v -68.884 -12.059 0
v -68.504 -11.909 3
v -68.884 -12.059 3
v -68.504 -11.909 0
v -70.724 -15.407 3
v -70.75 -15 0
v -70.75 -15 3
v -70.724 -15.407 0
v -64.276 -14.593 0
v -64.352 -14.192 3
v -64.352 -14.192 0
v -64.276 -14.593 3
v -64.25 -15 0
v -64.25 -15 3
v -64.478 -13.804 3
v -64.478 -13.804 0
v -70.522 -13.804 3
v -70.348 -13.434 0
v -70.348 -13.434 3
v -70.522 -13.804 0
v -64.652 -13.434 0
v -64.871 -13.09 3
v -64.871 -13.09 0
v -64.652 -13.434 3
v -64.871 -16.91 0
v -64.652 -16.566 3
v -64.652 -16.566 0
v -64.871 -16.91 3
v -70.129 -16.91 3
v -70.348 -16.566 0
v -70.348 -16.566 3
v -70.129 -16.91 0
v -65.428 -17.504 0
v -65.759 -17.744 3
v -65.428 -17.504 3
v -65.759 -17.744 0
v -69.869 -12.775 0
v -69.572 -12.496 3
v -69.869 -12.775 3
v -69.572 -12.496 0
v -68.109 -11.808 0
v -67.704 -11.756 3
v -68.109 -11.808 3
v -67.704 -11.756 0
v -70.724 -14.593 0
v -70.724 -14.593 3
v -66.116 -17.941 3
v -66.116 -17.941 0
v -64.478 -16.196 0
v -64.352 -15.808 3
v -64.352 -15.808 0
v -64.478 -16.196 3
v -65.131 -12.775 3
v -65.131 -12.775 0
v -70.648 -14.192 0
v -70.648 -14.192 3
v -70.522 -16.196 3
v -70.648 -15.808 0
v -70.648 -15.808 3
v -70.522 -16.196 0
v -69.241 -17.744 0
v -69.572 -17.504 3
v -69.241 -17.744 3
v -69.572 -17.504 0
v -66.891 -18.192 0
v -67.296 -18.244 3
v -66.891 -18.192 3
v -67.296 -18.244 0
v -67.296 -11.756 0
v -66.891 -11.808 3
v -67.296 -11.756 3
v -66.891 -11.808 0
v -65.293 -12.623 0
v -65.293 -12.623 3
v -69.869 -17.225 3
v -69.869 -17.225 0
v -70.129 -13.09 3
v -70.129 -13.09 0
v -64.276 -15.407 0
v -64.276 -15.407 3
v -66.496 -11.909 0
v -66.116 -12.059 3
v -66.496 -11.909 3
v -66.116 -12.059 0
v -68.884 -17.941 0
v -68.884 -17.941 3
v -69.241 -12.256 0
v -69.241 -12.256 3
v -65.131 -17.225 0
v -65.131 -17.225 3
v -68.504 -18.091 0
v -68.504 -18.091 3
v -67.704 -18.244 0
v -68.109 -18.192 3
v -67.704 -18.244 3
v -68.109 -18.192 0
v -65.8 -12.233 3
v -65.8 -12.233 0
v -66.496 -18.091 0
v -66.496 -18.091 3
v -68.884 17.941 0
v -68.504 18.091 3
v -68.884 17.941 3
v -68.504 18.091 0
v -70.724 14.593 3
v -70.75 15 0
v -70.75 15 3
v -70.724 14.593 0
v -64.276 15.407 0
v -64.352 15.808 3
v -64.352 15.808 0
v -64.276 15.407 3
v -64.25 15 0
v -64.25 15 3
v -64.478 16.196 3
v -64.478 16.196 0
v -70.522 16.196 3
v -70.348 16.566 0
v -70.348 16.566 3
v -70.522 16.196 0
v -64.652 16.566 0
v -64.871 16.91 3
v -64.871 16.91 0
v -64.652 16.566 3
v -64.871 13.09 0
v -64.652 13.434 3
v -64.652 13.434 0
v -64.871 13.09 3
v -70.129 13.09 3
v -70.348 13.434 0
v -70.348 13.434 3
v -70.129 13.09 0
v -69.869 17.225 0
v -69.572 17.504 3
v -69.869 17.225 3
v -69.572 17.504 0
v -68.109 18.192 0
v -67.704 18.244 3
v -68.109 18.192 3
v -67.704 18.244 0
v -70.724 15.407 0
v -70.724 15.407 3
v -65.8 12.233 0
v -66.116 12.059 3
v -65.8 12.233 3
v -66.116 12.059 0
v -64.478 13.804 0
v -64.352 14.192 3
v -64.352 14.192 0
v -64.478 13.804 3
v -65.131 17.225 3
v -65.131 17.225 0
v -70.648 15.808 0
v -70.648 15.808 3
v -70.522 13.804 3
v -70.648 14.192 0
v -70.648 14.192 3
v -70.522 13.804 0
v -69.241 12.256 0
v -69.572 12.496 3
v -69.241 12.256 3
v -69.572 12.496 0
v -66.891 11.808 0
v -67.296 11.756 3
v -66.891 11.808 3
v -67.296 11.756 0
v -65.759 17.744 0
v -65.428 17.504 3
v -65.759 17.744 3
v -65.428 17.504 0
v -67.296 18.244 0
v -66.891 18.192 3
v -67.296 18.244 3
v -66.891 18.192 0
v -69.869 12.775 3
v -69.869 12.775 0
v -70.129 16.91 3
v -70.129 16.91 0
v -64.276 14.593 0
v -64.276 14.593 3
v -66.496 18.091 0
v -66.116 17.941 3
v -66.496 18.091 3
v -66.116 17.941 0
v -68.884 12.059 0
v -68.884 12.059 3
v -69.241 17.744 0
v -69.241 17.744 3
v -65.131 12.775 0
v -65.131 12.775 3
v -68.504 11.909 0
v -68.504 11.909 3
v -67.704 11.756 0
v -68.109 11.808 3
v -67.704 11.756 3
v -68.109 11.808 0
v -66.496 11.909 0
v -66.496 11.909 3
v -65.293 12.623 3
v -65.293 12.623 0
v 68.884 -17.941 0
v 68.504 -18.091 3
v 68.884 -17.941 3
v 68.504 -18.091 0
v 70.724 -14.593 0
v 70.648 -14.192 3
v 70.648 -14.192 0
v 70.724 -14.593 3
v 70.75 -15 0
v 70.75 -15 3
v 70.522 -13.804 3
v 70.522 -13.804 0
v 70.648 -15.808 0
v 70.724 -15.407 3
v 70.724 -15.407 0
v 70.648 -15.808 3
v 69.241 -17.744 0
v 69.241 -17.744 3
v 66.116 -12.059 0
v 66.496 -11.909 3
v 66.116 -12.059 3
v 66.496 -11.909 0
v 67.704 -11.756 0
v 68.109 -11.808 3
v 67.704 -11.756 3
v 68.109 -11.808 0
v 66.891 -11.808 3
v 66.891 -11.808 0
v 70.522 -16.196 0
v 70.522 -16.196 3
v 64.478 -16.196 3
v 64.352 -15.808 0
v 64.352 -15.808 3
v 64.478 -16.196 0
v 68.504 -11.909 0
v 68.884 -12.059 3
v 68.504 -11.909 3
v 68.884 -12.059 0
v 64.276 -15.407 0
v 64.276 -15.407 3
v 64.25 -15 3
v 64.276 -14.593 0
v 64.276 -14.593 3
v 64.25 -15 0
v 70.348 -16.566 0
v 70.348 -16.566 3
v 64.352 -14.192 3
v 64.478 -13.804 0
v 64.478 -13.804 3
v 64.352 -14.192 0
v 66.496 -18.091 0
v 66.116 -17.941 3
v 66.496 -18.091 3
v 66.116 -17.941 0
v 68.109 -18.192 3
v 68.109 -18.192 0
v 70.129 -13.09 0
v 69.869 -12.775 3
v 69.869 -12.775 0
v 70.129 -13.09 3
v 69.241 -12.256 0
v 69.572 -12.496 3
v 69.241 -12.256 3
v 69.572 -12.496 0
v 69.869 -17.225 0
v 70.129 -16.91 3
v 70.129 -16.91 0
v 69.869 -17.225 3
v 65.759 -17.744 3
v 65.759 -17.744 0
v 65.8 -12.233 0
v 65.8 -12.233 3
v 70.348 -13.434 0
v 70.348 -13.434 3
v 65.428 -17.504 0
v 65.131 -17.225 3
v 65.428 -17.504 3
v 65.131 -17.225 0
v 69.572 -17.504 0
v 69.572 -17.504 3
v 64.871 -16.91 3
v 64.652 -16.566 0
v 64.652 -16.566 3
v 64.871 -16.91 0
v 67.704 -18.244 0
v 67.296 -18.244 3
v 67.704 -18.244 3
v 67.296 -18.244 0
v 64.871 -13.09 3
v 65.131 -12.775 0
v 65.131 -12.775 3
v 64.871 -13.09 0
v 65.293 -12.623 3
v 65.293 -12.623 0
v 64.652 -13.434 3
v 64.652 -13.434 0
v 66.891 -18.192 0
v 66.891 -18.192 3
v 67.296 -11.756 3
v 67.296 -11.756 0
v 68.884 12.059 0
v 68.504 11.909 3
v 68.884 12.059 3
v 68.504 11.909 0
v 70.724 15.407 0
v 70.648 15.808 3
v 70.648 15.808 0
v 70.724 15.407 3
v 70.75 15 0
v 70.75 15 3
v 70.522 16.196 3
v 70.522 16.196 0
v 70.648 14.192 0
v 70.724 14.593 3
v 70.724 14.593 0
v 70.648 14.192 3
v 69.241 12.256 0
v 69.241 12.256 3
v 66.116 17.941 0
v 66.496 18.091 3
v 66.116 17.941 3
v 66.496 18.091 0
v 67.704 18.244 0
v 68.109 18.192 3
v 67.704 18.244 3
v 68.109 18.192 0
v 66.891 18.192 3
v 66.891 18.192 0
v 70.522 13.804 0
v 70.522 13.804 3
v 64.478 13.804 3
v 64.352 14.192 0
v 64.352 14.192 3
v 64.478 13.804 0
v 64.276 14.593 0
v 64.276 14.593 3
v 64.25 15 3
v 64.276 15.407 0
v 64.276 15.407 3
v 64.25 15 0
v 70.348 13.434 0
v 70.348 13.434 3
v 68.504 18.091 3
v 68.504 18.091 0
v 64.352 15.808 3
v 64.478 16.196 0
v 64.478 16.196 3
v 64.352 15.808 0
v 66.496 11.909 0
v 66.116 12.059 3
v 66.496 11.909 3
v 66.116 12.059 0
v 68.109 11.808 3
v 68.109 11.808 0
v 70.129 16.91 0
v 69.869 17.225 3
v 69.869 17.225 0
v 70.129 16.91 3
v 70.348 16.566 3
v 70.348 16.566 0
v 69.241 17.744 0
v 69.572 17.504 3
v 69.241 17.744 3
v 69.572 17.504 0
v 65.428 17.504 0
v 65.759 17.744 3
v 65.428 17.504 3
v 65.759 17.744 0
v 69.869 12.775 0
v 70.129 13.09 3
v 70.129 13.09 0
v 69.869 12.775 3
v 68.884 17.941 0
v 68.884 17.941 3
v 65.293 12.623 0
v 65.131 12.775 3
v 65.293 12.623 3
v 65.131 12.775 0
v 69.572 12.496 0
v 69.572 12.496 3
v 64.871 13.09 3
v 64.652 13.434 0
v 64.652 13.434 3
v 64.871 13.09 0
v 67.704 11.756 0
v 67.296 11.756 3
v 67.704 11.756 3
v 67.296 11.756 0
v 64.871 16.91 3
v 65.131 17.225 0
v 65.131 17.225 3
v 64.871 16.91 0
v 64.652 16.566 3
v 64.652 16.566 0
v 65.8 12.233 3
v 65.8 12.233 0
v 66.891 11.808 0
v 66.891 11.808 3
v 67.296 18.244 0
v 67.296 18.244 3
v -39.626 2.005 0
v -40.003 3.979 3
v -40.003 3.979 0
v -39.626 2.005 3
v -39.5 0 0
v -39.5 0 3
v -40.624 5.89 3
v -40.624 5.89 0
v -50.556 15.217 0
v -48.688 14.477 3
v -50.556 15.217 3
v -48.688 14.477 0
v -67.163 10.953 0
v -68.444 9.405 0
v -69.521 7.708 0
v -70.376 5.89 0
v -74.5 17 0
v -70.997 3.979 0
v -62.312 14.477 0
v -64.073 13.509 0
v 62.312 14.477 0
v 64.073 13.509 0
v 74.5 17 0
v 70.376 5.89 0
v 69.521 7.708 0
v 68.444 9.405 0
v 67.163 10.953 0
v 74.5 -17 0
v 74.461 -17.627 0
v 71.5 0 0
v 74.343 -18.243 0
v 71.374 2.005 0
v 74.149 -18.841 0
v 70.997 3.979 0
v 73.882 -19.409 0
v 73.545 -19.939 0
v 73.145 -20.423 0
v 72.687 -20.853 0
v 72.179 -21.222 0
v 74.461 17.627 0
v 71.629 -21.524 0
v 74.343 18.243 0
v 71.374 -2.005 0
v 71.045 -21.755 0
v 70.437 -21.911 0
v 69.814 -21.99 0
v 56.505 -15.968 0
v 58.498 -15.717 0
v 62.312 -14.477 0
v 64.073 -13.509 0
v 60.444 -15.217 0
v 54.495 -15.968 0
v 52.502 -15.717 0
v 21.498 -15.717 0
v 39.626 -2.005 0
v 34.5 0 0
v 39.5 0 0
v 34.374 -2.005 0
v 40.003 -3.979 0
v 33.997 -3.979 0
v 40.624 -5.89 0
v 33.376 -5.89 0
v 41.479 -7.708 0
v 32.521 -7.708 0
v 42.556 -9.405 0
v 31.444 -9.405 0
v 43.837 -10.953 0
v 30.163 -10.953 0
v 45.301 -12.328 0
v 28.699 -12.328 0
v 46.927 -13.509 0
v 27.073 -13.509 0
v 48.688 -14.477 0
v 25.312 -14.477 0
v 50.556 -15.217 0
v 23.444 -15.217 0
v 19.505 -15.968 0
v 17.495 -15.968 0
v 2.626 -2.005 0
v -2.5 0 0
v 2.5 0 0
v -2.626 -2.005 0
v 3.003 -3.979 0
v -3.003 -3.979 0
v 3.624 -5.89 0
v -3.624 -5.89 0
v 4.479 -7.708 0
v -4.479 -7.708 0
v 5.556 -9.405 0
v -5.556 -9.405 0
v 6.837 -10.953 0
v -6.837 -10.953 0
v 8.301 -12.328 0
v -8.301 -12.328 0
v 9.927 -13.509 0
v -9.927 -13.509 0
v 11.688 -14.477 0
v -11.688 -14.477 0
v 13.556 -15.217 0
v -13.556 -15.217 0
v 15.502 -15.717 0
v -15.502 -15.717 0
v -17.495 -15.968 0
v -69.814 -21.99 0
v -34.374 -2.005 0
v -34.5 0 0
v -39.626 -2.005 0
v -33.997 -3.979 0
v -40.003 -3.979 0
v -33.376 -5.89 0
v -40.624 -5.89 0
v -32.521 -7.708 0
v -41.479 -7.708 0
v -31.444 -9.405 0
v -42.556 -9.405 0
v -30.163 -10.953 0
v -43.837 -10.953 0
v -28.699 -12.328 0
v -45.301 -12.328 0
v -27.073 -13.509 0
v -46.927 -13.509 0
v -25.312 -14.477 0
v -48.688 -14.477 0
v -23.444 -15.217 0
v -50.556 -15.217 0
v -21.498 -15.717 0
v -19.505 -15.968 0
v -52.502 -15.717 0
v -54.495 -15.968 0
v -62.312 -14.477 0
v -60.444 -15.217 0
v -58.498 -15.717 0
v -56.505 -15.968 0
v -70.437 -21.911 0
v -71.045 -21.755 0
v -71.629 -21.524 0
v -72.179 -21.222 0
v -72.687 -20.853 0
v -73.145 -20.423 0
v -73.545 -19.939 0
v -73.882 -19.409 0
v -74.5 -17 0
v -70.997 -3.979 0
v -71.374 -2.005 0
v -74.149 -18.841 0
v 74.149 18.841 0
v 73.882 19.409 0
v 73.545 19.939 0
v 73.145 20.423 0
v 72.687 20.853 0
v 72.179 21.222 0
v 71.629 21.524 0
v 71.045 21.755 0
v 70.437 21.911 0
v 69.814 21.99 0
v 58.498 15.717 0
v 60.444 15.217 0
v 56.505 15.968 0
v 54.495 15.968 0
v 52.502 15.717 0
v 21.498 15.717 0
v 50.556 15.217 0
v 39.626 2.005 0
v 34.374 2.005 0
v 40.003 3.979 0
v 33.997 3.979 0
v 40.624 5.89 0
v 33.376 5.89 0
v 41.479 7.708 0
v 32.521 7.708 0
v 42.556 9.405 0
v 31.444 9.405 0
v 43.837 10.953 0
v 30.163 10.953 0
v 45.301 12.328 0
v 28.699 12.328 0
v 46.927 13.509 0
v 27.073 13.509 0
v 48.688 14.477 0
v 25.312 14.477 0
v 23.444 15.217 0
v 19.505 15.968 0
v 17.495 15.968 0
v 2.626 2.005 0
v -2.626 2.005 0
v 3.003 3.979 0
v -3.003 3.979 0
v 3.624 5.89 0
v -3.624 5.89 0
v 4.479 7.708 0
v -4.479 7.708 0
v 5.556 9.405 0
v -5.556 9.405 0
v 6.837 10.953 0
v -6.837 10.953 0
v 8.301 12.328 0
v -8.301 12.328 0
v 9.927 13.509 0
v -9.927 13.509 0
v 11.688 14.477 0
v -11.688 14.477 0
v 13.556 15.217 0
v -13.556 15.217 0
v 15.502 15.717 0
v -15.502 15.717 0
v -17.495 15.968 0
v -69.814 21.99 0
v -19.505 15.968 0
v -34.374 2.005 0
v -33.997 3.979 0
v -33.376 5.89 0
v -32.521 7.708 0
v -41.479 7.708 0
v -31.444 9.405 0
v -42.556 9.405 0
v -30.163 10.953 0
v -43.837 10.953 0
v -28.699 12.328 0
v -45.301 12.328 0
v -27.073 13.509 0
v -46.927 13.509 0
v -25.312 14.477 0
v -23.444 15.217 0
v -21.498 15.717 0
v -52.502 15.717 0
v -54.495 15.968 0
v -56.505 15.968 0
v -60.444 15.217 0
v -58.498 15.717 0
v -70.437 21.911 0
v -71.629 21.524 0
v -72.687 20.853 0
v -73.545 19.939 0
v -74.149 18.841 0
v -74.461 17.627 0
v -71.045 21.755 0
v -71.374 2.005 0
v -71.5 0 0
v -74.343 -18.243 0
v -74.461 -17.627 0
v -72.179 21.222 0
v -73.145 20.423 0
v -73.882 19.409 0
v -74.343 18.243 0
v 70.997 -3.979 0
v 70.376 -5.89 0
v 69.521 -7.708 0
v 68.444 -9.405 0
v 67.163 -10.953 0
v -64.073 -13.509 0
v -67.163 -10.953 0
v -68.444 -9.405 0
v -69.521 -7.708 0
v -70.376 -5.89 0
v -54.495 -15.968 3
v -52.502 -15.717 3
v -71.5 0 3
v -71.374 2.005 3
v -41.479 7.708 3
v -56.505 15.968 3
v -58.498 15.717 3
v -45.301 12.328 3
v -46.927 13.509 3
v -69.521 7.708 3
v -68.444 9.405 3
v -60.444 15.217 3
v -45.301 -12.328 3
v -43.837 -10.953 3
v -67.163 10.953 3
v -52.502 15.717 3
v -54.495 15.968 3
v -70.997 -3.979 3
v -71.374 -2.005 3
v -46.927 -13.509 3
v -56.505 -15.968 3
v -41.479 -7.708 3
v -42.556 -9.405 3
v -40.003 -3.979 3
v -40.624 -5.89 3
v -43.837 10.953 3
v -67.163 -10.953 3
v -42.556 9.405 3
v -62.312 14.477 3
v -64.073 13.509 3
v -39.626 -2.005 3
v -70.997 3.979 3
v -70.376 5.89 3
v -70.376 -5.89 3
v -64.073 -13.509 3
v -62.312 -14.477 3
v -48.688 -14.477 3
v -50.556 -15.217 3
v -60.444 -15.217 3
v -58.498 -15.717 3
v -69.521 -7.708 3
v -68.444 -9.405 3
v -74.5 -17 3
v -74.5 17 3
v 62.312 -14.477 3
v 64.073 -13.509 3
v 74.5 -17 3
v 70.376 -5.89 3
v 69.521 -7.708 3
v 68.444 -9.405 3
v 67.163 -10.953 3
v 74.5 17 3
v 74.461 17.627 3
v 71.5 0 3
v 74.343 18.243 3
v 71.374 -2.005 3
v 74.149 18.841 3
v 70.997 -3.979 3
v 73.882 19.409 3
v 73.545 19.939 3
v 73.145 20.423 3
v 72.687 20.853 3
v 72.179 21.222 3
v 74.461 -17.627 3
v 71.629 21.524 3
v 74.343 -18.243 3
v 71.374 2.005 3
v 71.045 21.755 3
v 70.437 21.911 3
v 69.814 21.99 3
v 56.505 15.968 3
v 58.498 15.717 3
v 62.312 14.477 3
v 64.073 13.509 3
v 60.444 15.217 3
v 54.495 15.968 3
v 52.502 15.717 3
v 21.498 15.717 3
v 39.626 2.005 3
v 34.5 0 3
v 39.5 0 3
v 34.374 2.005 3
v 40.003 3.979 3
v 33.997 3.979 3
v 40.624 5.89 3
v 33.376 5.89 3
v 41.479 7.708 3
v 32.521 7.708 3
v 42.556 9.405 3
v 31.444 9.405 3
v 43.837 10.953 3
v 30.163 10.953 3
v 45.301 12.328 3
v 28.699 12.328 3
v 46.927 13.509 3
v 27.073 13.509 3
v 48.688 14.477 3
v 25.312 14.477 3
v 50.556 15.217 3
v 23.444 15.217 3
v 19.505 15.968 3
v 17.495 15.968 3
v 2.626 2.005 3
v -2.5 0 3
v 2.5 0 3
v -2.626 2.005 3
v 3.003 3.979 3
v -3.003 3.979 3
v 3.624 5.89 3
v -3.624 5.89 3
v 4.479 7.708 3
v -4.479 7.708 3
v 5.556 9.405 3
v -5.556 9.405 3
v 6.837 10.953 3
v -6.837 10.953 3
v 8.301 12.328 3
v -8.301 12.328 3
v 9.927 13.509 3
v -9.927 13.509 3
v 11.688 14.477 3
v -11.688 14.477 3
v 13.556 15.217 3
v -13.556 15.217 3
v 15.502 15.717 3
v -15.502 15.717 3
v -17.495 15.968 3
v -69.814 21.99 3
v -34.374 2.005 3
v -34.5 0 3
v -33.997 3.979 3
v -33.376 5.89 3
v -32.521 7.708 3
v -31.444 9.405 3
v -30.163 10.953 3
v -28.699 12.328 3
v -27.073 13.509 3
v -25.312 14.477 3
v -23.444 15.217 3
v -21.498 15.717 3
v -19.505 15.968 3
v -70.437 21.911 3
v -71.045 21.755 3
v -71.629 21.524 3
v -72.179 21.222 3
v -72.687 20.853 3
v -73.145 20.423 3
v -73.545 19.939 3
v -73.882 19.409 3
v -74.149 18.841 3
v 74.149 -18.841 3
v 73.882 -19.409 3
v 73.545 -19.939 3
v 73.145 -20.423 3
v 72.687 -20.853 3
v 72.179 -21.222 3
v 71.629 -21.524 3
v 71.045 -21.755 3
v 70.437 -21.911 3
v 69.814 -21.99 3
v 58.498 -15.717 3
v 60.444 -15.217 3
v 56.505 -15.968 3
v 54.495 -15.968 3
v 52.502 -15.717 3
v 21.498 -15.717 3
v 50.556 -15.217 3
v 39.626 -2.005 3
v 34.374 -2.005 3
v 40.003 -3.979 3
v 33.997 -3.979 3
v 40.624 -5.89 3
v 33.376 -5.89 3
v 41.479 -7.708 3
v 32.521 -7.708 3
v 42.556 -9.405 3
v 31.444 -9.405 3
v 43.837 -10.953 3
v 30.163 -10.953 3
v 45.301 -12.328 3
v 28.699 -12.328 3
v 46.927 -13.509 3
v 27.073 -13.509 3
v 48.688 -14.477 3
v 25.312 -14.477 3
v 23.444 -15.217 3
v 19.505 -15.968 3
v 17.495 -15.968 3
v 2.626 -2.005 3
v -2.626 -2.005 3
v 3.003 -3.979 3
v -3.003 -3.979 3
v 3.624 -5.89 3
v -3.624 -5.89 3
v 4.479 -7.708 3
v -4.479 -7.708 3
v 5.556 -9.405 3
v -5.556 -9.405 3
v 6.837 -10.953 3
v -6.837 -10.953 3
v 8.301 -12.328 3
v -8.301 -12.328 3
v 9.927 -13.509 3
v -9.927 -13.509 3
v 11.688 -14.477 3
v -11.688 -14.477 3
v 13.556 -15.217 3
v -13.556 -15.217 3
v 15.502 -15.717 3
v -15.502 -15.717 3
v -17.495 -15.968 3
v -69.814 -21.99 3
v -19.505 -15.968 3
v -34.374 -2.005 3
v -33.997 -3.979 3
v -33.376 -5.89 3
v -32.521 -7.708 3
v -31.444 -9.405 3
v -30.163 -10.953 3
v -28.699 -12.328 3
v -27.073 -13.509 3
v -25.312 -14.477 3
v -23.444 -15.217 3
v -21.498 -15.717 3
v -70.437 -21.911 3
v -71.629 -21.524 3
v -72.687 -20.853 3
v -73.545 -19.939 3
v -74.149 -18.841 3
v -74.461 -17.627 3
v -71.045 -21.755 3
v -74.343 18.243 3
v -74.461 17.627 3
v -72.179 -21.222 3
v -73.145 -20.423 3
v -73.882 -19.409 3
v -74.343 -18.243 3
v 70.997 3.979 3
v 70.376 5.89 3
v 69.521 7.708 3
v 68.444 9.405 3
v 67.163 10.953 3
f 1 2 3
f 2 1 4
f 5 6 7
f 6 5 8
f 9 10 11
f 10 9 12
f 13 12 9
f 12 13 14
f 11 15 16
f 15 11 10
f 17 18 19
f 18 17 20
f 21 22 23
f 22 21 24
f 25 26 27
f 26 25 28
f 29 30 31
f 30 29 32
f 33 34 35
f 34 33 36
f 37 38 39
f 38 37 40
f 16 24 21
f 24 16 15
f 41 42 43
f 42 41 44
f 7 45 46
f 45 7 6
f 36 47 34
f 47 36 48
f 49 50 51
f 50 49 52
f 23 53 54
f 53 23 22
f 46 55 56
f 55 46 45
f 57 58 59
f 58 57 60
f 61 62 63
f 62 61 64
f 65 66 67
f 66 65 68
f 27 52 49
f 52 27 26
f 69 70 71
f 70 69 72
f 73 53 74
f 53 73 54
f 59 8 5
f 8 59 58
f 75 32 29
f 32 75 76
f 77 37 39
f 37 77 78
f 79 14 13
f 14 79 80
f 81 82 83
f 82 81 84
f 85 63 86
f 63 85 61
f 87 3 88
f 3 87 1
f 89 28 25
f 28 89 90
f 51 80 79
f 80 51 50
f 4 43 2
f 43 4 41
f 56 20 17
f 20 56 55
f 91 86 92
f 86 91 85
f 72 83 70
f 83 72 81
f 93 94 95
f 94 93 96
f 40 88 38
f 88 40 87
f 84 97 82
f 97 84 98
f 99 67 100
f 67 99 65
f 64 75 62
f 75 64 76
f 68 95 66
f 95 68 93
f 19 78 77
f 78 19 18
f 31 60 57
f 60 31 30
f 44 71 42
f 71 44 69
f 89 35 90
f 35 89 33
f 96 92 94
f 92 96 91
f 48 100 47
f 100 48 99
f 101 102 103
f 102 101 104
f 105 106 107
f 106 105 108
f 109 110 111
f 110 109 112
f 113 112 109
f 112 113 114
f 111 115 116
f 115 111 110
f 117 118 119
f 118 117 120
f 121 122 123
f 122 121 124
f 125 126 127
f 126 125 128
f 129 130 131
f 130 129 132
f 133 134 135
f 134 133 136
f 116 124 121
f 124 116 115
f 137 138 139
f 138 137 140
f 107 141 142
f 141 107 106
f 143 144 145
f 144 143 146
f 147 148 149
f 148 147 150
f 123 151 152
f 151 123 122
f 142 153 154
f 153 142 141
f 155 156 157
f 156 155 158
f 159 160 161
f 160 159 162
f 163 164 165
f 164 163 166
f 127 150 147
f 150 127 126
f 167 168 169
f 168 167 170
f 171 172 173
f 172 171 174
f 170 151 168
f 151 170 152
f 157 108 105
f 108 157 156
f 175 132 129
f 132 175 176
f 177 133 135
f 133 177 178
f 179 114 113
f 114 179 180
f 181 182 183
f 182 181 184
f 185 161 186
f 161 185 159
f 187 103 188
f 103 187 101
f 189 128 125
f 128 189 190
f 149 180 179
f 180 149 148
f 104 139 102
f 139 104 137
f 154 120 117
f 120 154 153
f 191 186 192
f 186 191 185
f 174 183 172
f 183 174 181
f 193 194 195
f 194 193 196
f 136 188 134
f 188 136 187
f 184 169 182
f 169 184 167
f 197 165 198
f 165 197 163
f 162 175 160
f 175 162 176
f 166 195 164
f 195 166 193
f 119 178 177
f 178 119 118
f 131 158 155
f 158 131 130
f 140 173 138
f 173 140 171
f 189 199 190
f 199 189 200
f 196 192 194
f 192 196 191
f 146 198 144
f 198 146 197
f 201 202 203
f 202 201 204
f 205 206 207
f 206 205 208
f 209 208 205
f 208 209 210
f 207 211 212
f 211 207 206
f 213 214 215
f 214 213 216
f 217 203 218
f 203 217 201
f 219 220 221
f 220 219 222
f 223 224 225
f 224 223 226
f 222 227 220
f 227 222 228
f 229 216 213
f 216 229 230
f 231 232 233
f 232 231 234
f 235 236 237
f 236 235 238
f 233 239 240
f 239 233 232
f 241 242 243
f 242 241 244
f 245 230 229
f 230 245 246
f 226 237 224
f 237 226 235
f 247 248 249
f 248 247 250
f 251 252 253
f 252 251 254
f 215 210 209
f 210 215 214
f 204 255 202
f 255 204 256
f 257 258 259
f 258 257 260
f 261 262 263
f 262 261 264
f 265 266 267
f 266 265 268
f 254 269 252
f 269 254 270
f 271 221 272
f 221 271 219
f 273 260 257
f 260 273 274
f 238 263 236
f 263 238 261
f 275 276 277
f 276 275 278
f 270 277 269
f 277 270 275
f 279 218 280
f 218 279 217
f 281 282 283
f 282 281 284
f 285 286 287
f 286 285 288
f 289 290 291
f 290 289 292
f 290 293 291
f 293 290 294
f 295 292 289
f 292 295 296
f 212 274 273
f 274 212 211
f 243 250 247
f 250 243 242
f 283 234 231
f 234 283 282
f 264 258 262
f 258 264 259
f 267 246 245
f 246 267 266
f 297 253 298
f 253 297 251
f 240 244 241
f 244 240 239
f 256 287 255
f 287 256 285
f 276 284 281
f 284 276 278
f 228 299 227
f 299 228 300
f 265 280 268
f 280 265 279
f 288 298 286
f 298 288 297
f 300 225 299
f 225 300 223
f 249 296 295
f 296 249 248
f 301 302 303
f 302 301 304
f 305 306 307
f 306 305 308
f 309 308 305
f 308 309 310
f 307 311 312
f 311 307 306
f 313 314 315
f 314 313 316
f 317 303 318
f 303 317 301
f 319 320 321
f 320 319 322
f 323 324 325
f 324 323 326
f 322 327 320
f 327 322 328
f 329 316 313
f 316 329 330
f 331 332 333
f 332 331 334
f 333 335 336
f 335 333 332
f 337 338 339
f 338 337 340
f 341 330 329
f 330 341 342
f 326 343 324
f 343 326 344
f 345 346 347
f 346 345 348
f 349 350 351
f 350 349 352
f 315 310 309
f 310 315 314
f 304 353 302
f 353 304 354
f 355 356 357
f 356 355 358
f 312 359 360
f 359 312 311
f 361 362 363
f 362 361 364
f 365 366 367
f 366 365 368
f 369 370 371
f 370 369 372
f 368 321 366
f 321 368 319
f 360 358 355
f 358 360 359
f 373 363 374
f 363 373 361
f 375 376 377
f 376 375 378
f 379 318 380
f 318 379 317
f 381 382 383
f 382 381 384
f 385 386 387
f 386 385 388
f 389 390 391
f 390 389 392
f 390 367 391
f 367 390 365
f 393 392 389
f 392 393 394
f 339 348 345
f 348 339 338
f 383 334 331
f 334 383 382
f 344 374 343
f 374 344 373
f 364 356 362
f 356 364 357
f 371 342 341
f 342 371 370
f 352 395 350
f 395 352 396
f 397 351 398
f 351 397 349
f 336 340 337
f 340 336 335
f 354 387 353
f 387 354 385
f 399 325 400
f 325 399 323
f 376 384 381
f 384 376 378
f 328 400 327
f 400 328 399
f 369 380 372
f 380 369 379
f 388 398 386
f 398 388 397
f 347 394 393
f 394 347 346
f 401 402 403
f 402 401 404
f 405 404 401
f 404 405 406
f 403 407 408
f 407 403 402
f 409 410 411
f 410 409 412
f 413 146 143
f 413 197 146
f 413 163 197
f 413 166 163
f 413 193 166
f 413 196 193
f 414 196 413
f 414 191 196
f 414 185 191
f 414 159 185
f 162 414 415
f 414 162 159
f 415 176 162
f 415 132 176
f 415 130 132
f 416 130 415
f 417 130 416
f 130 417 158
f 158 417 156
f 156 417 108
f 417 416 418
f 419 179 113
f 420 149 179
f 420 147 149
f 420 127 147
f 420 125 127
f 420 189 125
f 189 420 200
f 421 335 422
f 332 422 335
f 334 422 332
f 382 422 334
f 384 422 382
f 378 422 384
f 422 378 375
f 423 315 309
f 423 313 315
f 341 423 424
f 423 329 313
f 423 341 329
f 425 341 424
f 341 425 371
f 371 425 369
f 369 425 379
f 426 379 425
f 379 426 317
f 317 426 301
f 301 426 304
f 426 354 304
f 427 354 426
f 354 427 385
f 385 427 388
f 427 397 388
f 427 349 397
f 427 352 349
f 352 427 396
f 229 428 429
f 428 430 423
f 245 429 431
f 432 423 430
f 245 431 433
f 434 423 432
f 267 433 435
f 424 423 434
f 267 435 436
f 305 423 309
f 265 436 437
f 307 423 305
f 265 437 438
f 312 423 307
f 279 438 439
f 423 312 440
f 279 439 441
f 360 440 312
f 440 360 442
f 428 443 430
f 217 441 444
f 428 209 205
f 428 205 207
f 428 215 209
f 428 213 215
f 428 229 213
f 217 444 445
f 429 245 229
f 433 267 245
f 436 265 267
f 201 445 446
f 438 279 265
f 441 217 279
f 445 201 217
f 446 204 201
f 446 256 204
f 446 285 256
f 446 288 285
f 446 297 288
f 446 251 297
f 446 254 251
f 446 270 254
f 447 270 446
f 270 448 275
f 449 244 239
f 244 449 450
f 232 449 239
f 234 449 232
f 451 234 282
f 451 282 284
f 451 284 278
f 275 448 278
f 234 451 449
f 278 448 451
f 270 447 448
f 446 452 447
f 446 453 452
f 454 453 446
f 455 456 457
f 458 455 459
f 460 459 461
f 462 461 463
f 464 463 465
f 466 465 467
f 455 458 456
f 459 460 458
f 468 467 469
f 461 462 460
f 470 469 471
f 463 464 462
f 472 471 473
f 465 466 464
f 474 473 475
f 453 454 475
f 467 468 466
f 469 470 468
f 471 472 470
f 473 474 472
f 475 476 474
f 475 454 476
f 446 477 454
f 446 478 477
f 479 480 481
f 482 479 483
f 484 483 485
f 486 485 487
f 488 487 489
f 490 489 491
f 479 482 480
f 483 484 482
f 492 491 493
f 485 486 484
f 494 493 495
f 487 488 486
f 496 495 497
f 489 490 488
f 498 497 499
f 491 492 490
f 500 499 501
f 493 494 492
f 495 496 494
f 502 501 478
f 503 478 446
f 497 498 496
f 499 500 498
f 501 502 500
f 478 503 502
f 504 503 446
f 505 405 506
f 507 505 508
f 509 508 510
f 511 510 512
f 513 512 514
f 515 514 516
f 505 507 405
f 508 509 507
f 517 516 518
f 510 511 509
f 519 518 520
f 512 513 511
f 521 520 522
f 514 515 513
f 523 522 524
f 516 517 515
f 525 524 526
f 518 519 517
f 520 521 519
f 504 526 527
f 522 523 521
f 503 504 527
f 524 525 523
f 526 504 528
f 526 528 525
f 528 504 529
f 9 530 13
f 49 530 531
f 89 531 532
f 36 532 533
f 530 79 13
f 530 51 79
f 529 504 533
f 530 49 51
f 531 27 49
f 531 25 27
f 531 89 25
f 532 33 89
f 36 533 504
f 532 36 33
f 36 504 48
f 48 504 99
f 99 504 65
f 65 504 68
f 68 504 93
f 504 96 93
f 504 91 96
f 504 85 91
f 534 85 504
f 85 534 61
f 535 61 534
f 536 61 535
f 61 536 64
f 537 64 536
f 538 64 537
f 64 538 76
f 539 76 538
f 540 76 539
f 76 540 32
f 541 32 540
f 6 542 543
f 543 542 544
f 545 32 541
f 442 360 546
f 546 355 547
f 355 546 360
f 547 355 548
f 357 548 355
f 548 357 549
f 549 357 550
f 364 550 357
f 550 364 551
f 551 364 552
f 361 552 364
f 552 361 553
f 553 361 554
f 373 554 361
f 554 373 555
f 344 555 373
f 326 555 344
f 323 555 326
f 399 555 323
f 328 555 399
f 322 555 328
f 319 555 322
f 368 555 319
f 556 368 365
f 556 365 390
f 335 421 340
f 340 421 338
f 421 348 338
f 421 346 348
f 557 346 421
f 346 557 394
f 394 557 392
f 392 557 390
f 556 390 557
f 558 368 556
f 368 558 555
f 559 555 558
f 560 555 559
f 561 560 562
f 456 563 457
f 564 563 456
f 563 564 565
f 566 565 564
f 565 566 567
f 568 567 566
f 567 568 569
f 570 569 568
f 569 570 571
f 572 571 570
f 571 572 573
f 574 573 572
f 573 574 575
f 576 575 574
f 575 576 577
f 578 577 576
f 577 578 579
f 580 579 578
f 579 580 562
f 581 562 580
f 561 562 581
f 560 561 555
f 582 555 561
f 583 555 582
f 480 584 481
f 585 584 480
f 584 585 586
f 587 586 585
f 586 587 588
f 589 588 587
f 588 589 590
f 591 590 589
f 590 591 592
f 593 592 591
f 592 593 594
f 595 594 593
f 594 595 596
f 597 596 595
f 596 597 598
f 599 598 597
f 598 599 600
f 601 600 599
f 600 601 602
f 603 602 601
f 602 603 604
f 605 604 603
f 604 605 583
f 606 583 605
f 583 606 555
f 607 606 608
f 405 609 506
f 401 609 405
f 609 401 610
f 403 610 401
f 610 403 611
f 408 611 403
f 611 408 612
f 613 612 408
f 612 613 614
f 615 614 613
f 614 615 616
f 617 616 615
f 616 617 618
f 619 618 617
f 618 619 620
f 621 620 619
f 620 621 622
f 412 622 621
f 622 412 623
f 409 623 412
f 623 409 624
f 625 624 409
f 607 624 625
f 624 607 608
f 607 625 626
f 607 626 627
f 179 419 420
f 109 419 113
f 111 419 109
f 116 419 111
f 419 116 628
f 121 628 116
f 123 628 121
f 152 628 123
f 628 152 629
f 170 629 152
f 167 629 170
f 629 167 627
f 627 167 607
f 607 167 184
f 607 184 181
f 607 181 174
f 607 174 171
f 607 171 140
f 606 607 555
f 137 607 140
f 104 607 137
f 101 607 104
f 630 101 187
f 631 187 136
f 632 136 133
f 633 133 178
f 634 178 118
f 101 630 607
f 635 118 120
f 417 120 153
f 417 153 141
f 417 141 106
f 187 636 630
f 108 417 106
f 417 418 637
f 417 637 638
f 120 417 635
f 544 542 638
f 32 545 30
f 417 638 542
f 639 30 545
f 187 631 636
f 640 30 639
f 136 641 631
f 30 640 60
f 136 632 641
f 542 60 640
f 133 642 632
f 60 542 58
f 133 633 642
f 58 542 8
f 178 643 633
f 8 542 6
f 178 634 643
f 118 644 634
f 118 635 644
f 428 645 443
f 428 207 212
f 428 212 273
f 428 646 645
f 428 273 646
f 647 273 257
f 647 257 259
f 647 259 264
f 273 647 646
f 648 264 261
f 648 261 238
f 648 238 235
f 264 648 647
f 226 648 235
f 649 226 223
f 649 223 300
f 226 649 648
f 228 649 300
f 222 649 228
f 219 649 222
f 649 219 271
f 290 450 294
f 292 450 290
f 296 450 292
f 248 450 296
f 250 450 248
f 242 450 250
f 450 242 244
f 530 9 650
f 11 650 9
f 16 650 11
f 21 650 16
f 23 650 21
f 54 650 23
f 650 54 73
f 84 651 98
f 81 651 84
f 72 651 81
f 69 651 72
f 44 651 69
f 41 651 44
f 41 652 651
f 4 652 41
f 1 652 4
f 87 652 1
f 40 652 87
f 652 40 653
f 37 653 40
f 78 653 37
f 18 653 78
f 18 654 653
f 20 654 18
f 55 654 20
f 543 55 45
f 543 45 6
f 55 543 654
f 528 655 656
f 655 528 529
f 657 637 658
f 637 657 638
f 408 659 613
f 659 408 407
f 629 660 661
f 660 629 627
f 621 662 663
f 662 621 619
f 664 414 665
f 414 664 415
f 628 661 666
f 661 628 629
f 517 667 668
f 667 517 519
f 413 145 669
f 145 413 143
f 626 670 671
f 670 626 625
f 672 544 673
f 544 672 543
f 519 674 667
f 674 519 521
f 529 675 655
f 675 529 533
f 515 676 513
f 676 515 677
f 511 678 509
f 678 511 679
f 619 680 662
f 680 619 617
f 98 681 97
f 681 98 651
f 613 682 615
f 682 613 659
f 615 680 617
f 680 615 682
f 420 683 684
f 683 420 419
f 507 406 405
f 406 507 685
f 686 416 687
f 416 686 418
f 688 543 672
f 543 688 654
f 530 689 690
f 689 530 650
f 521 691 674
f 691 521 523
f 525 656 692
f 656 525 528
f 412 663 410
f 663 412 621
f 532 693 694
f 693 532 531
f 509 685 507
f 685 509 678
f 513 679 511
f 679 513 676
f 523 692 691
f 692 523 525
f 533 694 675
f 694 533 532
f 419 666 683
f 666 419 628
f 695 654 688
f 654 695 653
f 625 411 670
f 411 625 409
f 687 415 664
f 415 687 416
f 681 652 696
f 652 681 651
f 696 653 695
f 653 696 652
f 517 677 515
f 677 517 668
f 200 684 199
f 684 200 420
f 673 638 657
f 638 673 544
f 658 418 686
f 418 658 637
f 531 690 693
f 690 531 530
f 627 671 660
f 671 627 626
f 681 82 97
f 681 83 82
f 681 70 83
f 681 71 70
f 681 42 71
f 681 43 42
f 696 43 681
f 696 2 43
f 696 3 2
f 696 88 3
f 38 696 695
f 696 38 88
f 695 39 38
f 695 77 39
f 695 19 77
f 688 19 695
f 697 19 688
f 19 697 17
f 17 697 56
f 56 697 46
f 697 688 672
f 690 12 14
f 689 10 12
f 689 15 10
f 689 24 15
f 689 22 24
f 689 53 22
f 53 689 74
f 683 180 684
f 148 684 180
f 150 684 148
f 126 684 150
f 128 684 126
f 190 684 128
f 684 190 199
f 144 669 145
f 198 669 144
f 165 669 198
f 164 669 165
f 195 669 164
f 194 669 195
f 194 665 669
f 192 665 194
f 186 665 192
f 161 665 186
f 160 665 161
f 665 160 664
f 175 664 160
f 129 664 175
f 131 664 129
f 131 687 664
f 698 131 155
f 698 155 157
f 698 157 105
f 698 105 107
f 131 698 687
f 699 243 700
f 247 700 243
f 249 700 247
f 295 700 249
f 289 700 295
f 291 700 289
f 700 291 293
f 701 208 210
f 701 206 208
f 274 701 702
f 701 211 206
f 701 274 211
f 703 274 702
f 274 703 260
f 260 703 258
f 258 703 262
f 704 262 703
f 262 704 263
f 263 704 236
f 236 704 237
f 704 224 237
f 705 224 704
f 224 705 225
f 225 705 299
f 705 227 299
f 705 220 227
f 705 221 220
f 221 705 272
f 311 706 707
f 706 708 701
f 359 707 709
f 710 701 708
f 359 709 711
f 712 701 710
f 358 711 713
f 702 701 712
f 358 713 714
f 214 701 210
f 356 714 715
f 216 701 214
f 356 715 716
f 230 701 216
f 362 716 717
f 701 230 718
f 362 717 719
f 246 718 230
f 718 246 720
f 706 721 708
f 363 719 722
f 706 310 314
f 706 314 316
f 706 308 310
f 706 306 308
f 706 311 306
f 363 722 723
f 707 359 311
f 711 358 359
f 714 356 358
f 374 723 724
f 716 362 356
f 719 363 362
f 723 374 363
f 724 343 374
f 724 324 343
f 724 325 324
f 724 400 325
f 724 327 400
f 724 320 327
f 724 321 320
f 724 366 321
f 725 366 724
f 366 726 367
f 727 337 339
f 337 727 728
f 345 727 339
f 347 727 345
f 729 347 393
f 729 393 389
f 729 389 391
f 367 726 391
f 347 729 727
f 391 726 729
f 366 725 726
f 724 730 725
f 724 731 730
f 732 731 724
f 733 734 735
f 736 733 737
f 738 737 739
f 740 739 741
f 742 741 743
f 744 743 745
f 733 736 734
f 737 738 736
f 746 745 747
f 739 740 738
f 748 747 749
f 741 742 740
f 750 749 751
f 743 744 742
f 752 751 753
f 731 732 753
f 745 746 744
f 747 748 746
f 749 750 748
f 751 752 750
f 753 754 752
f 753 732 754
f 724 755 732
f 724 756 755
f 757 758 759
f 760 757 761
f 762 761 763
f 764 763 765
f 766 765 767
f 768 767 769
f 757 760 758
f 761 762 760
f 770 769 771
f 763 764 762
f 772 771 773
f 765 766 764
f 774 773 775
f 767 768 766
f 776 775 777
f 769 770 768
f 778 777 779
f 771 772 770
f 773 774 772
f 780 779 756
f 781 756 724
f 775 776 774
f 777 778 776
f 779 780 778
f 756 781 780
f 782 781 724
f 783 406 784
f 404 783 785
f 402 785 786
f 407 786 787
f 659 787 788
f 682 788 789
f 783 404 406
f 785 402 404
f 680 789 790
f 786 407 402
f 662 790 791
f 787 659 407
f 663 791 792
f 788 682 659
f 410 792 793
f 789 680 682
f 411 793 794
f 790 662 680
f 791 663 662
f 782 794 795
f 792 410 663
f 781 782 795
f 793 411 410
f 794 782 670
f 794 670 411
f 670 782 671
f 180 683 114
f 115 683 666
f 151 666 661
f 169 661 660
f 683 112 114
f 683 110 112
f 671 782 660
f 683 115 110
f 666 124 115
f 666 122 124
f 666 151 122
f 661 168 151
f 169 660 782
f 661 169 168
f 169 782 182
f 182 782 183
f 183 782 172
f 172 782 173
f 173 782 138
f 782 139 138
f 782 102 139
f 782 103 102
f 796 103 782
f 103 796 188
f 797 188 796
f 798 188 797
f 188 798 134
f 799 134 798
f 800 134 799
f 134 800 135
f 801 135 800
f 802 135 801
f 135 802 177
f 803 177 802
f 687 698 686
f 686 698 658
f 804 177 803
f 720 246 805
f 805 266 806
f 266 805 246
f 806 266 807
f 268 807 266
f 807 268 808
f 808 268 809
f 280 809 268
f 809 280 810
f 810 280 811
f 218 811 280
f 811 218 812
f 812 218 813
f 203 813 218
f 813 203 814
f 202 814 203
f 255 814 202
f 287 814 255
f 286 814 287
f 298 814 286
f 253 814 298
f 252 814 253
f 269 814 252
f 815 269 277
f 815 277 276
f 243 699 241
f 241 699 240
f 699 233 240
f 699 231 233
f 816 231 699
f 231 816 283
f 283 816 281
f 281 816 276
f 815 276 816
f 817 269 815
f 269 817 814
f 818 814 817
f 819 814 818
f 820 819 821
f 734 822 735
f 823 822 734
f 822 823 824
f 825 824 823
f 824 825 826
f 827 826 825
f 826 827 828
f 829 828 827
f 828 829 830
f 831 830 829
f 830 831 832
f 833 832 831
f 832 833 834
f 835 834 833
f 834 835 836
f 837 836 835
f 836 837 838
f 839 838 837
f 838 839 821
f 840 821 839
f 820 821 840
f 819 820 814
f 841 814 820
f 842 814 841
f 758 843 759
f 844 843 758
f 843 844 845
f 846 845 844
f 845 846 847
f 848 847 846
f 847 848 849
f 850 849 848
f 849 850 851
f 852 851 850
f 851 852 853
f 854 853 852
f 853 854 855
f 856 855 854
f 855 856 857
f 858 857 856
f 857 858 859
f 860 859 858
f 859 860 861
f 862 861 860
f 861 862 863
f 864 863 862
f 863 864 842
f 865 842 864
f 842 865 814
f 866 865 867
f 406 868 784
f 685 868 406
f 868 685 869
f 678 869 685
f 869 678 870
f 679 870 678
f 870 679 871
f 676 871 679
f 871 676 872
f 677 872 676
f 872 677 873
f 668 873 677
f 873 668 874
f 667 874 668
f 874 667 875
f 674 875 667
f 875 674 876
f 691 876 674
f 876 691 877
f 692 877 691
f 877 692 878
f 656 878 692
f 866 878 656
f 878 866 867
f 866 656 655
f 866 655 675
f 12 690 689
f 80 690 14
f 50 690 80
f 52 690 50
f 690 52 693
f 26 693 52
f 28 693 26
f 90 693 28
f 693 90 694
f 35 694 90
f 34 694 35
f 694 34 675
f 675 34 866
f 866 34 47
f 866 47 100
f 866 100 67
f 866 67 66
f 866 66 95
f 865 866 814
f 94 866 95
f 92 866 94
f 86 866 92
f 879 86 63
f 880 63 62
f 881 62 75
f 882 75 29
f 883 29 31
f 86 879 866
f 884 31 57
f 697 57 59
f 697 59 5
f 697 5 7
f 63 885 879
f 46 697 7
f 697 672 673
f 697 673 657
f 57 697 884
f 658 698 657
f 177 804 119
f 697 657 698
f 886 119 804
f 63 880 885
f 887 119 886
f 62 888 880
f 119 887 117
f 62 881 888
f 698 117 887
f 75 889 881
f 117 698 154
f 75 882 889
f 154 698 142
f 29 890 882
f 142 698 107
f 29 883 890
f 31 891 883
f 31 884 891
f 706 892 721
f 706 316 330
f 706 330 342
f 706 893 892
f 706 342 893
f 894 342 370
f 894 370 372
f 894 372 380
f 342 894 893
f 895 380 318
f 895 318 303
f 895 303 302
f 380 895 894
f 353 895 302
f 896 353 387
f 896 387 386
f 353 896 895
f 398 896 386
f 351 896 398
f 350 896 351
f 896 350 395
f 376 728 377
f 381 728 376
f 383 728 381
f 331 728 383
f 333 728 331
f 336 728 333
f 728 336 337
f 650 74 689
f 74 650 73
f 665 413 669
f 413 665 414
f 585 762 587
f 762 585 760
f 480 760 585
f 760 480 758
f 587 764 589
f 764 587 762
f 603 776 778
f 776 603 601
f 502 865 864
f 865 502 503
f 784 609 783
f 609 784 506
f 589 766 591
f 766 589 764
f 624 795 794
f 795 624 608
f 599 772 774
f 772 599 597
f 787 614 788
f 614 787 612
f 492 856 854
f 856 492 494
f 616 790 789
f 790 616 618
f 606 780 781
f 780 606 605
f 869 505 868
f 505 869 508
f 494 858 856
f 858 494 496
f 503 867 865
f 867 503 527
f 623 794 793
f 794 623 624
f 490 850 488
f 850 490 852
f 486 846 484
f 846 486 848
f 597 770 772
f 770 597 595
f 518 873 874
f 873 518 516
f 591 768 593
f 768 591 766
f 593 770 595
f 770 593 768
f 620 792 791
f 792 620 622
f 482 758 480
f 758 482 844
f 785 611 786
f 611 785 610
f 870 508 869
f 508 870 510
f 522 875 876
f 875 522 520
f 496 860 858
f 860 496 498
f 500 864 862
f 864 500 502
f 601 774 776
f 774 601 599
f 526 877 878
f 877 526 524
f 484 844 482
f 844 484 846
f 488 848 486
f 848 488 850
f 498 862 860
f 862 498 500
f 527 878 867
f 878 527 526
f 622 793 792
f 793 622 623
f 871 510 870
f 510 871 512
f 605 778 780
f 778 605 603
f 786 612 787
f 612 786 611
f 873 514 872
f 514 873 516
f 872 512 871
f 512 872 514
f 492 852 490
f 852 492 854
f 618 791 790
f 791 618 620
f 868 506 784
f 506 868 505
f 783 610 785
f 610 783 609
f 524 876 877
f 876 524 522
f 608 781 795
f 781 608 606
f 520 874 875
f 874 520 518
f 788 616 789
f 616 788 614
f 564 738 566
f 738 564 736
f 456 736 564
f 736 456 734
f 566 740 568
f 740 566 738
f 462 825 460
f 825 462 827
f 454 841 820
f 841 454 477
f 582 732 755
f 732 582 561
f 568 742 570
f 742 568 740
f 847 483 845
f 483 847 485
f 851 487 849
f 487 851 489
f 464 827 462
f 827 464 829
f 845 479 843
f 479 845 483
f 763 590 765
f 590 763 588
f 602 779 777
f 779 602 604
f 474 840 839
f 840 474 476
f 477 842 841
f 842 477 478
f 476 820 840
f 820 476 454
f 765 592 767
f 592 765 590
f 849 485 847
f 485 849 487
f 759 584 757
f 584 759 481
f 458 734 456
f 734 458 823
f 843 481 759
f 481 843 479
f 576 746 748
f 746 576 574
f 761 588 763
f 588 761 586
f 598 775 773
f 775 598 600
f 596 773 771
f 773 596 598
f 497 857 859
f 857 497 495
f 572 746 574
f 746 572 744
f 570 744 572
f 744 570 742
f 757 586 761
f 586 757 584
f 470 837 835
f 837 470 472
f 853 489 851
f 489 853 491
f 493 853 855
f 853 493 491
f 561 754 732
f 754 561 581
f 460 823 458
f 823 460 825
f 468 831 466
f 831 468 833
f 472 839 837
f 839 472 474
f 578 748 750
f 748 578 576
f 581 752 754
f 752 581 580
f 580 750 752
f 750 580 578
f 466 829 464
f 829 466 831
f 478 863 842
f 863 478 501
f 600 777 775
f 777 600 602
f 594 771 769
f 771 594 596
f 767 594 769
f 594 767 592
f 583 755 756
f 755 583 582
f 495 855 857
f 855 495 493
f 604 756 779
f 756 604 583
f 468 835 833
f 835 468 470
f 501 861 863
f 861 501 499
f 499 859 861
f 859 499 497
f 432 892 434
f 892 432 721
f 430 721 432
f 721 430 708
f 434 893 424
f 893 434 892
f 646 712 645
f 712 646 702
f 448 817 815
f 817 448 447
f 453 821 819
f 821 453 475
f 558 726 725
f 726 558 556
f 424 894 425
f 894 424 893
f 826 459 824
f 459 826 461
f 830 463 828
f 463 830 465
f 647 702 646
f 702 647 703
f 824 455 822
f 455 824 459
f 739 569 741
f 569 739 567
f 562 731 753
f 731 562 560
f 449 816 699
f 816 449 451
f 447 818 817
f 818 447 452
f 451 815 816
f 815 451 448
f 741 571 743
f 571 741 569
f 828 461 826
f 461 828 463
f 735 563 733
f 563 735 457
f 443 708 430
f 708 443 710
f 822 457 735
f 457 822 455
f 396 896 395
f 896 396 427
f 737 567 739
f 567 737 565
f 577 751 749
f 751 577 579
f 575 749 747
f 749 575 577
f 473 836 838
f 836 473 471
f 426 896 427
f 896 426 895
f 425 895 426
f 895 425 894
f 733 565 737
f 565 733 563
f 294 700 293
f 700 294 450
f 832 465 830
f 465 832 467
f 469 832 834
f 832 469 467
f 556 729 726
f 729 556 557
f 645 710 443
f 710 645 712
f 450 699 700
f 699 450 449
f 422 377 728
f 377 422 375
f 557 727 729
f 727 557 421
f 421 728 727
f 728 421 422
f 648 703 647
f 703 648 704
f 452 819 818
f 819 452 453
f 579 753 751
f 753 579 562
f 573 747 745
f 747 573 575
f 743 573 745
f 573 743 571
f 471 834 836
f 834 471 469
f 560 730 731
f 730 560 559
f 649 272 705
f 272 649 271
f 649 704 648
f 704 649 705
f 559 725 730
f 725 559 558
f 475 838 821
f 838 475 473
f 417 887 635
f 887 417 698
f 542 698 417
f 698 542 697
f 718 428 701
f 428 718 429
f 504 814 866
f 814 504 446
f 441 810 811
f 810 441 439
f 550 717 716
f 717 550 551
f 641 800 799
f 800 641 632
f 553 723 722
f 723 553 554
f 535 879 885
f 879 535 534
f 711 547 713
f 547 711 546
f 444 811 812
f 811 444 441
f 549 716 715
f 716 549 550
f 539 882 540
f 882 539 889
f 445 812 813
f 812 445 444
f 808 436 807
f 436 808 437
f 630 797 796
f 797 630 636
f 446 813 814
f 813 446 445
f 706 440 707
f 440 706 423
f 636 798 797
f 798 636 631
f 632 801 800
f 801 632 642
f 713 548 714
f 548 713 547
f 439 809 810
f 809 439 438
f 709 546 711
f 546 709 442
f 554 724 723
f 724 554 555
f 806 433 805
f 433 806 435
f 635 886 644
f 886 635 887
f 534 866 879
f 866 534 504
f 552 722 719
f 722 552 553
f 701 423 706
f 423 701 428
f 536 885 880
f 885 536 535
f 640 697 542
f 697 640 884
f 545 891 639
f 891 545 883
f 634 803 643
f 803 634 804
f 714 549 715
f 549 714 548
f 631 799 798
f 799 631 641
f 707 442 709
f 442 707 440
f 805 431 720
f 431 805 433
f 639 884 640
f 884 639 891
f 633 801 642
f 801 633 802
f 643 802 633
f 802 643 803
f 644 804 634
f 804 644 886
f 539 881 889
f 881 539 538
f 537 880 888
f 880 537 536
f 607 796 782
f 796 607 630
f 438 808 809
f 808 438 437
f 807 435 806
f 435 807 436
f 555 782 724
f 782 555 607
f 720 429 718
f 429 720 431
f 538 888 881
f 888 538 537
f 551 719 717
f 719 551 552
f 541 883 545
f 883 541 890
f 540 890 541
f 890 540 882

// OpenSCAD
$fn = 50;

difference() {
	union() {
		hull() {
			translate(v = [-69.5, 17.0, 0]) {
				cylinder(h = 3, r = 5);
			}
			translate(v = [69.5, 17.0, 0]) {
				cylinder(h = 3, r = 5);
			}
			translate(v = [-69.5, -17.0, 0]) {
				cylinder(h = 3, r = 5);
			}
			translate(v = [69.5, -17.0, 0]) {
				cylinder(h = 3, r = 5);
			}
		}
	}
	union() {
		translate(v = [-67.5, -15.0, -100.0]) {
			cylinder(h = 200, r = 3.25);
		}
		translate(v = [-67.5, 15.0, -100.0]) {
			cylinder(h = 200, r = 3.25);
		}
		translate(v = [67.5, -15.0, -100.0]) {
			cylinder(h = 200, r = 3.25);
		}
		translate(v = [67.5, 15.0, -100.0]) {
			cylinder(h = 200, r = 3.25);
		}
		translate(v = [-67.5, -15.0, -100.0]) {
			cylinder(h = 200, r = 1.8);
		}
		translate(v = [-67.5, 15.0, -100.0]) {
			cylinder(h = 200, r = 1.8);
		}
		translate(v = [67.5, -15.0, -100.0]) {
			cylinder(h = 200, r = 1.8);
		}
		translate(v = [67.5, 15.0, -100.0]) {
			cylinder(h = 200, r = 1.8);
		}
		translate(v = [-55.5, 0, 0.0]) {
			cylinder(h = 3, r = 16.0);
		}
		translate(v = [-18.5, 0, 0.0]) {
			cylinder(h = 3, r = 16.0);
		}
		translate(v = [18.5, 0, 0.0]) {
			cylinder(h = 3, r = 16.0);
		}
		translate(v = [55.5, 0, 0.0]) {
			cylinder(h = 3, r = 16.0);
		}
	}
}
